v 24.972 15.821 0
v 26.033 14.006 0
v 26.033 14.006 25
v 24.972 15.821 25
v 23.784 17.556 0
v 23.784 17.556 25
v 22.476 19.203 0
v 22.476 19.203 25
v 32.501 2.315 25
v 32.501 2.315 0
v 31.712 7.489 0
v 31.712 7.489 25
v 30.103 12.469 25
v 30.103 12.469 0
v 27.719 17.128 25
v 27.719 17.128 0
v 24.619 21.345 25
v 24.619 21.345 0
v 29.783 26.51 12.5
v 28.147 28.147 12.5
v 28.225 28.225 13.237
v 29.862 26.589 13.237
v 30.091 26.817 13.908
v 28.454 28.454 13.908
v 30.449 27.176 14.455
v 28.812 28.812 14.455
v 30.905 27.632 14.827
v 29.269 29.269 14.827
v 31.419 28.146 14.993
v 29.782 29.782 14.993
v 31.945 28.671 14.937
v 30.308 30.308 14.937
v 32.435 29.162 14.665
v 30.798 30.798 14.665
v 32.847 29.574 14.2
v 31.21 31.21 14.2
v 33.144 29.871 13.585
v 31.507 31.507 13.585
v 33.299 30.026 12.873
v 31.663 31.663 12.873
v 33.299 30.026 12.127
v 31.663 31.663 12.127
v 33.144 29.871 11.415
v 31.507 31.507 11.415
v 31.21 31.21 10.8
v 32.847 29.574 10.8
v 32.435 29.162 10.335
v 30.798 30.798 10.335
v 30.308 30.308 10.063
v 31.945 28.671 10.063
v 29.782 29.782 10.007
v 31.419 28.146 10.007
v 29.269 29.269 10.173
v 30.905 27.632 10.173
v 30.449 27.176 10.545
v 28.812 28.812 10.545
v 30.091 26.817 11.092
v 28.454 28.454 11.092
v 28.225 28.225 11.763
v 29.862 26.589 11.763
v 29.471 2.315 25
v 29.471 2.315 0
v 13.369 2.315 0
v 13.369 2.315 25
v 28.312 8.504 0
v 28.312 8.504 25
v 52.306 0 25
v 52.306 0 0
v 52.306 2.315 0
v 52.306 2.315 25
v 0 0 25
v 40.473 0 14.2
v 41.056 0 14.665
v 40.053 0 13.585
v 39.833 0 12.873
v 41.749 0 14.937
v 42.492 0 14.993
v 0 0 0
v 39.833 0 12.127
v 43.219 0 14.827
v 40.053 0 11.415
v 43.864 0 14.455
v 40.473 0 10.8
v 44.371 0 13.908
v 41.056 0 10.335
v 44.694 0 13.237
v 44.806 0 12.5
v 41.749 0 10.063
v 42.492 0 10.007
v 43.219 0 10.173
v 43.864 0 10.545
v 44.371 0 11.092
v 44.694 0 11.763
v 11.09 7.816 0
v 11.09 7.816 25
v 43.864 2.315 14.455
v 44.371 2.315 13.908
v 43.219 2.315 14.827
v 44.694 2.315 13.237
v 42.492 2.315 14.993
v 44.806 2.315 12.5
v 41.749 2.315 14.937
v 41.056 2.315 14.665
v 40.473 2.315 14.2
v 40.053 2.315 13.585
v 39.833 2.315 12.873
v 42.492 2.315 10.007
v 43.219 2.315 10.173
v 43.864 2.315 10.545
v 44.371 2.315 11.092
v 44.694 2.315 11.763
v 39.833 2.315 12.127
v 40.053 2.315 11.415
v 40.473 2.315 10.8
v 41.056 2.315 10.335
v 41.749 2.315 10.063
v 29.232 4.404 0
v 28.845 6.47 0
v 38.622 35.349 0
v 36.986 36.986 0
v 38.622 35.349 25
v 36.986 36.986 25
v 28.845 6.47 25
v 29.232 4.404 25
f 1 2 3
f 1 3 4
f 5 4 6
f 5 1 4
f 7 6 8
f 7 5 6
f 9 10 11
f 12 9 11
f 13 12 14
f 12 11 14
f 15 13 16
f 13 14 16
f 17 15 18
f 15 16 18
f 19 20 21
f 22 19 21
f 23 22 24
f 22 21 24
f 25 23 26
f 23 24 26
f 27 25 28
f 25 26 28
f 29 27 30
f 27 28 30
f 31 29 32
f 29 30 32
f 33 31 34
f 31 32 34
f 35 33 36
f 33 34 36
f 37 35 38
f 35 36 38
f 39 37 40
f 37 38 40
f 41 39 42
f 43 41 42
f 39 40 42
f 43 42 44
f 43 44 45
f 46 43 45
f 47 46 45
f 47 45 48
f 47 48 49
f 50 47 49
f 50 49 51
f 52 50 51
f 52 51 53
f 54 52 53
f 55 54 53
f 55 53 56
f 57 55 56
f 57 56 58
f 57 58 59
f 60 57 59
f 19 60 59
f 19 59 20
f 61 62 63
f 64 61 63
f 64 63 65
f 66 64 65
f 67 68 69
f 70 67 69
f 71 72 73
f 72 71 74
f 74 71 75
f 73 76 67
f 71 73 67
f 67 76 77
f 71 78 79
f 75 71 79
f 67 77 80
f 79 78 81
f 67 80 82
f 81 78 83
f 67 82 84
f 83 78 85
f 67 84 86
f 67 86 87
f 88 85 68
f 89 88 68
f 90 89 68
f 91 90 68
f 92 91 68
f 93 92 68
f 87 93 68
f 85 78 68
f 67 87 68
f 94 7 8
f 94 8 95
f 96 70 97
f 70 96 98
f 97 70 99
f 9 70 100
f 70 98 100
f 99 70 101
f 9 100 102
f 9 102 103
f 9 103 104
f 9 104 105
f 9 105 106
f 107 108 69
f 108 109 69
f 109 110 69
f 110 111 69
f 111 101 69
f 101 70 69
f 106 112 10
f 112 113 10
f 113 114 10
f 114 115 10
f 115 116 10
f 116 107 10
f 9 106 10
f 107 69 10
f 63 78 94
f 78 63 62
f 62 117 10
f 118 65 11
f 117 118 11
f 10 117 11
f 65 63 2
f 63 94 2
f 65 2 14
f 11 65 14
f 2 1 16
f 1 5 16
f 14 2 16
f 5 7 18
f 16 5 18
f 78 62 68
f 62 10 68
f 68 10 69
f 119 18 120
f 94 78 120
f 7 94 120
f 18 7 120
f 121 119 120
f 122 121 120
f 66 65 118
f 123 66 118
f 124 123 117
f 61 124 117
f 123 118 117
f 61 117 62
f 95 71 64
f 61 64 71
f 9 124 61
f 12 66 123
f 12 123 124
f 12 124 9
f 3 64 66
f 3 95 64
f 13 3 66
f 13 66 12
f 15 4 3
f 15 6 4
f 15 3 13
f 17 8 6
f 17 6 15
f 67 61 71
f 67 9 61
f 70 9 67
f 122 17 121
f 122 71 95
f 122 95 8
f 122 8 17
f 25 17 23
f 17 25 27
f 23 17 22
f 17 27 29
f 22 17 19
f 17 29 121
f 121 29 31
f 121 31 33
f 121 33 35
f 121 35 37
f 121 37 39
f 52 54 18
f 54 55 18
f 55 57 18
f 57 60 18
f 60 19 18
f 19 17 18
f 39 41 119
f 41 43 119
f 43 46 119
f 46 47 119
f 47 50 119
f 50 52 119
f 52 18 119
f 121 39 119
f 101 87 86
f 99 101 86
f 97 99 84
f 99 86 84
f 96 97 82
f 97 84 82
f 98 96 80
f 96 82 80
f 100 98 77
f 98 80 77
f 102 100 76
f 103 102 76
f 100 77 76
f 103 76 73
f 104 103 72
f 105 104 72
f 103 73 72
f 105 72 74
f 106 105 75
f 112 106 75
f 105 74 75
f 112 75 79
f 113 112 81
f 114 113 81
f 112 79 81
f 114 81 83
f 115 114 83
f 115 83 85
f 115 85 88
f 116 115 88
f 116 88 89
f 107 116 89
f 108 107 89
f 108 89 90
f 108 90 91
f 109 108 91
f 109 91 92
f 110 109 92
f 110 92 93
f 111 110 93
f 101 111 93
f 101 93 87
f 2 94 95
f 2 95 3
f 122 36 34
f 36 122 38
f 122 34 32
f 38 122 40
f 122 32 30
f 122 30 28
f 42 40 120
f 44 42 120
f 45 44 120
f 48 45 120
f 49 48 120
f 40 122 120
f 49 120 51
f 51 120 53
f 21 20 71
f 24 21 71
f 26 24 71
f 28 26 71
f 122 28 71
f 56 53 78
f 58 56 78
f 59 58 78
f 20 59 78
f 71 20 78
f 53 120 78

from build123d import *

# Parameters (mm, degrees)
EXTRUDE_1_DEPTH     = 25
SKETCH_4_R          = 2.5
CUT_EXTRUDE_1_DEPTH = 69.766316506
SKETCH_5_R          = 2.5
CUT_EXTRUDE_2_DEPTH = 69.766316506


with BuildPart() as part:
    # 草圖1 → 填料-伸長1 (new body)
    with BuildSketch(Plane.XY):
        with BuildLine():
            Line((0, 0), (52.305552833, 0))
            Line((52.305552833, 0), (52.305552833, 2.314523209))
            Line((52.305552833, 2.314523209), (32.501449094, 2.314523209))
            ThreePointArc((32.501449094, 2.314523209), (30.103466052, 12.469263913), (24.618610108, 21.345379996))
            Line((24.618610108, 21.345379996), (38.622226158, 35.348996046))
            Line((38.622226158, 35.348996046), (36.985611102, 36.985611102))
            Line((36.985611102, 36.985611102), (0, 0))
        make_face()
        with BuildLine():
            Line((29.470981811, 2.314523209), (13.368711302, 2.314523209))
            Line((13.368711302, 2.314523209), (28.312069292, 8.504264755))
            ThreePointArc((28.312069292, 8.504264755), (29.056814584, 5.44034124), (29.470981811, 2.314523209))
        make_face(mode=Mode.SUBTRACT)
        with BuildLine():
            Line((11.089721473, 7.816491361), (26.033079463, 14.006232908))
            ThreePointArc((26.033079463, 14.006232908), (24.393172815, 16.69936845), (22.475746143, 19.202516031))
            Line((22.475746143, 19.202516031), (11.089721473, 7.816491361))
        make_face(mode=Mode.SUBTRACT)
    extrude(amount=EXTRUDE_1_DEPTH)

    # 草圖4 → 除料-伸長1 (cut, through all)
    with BuildSketch(Plane.XZ):
        with Locations((42.305552833, 12.5)):
            Circle(SKETCH_4_R)
    extrude(amount=-CUT_EXTRUDE_1_DEPTH, mode=Mode.SUBTRACT)

    # 草圖5 → 除料-伸長2 (cut, through all)
    with BuildSketch(Plane(origin=(0, 0, 0), x_dir=(0, 0, 1), z_dir=(-0.7071067811865479, 0.7071067811865472, 0))):
        with Locations(Location((12.5, 42.305552833, 0), (0, 0, 270))):
            Circle(SKETCH_5_R)
    extrude(amount=-CUT_EXTRUDE_2_DEPTH, mode=Mode.SUBTRACT)


solid = part.part
